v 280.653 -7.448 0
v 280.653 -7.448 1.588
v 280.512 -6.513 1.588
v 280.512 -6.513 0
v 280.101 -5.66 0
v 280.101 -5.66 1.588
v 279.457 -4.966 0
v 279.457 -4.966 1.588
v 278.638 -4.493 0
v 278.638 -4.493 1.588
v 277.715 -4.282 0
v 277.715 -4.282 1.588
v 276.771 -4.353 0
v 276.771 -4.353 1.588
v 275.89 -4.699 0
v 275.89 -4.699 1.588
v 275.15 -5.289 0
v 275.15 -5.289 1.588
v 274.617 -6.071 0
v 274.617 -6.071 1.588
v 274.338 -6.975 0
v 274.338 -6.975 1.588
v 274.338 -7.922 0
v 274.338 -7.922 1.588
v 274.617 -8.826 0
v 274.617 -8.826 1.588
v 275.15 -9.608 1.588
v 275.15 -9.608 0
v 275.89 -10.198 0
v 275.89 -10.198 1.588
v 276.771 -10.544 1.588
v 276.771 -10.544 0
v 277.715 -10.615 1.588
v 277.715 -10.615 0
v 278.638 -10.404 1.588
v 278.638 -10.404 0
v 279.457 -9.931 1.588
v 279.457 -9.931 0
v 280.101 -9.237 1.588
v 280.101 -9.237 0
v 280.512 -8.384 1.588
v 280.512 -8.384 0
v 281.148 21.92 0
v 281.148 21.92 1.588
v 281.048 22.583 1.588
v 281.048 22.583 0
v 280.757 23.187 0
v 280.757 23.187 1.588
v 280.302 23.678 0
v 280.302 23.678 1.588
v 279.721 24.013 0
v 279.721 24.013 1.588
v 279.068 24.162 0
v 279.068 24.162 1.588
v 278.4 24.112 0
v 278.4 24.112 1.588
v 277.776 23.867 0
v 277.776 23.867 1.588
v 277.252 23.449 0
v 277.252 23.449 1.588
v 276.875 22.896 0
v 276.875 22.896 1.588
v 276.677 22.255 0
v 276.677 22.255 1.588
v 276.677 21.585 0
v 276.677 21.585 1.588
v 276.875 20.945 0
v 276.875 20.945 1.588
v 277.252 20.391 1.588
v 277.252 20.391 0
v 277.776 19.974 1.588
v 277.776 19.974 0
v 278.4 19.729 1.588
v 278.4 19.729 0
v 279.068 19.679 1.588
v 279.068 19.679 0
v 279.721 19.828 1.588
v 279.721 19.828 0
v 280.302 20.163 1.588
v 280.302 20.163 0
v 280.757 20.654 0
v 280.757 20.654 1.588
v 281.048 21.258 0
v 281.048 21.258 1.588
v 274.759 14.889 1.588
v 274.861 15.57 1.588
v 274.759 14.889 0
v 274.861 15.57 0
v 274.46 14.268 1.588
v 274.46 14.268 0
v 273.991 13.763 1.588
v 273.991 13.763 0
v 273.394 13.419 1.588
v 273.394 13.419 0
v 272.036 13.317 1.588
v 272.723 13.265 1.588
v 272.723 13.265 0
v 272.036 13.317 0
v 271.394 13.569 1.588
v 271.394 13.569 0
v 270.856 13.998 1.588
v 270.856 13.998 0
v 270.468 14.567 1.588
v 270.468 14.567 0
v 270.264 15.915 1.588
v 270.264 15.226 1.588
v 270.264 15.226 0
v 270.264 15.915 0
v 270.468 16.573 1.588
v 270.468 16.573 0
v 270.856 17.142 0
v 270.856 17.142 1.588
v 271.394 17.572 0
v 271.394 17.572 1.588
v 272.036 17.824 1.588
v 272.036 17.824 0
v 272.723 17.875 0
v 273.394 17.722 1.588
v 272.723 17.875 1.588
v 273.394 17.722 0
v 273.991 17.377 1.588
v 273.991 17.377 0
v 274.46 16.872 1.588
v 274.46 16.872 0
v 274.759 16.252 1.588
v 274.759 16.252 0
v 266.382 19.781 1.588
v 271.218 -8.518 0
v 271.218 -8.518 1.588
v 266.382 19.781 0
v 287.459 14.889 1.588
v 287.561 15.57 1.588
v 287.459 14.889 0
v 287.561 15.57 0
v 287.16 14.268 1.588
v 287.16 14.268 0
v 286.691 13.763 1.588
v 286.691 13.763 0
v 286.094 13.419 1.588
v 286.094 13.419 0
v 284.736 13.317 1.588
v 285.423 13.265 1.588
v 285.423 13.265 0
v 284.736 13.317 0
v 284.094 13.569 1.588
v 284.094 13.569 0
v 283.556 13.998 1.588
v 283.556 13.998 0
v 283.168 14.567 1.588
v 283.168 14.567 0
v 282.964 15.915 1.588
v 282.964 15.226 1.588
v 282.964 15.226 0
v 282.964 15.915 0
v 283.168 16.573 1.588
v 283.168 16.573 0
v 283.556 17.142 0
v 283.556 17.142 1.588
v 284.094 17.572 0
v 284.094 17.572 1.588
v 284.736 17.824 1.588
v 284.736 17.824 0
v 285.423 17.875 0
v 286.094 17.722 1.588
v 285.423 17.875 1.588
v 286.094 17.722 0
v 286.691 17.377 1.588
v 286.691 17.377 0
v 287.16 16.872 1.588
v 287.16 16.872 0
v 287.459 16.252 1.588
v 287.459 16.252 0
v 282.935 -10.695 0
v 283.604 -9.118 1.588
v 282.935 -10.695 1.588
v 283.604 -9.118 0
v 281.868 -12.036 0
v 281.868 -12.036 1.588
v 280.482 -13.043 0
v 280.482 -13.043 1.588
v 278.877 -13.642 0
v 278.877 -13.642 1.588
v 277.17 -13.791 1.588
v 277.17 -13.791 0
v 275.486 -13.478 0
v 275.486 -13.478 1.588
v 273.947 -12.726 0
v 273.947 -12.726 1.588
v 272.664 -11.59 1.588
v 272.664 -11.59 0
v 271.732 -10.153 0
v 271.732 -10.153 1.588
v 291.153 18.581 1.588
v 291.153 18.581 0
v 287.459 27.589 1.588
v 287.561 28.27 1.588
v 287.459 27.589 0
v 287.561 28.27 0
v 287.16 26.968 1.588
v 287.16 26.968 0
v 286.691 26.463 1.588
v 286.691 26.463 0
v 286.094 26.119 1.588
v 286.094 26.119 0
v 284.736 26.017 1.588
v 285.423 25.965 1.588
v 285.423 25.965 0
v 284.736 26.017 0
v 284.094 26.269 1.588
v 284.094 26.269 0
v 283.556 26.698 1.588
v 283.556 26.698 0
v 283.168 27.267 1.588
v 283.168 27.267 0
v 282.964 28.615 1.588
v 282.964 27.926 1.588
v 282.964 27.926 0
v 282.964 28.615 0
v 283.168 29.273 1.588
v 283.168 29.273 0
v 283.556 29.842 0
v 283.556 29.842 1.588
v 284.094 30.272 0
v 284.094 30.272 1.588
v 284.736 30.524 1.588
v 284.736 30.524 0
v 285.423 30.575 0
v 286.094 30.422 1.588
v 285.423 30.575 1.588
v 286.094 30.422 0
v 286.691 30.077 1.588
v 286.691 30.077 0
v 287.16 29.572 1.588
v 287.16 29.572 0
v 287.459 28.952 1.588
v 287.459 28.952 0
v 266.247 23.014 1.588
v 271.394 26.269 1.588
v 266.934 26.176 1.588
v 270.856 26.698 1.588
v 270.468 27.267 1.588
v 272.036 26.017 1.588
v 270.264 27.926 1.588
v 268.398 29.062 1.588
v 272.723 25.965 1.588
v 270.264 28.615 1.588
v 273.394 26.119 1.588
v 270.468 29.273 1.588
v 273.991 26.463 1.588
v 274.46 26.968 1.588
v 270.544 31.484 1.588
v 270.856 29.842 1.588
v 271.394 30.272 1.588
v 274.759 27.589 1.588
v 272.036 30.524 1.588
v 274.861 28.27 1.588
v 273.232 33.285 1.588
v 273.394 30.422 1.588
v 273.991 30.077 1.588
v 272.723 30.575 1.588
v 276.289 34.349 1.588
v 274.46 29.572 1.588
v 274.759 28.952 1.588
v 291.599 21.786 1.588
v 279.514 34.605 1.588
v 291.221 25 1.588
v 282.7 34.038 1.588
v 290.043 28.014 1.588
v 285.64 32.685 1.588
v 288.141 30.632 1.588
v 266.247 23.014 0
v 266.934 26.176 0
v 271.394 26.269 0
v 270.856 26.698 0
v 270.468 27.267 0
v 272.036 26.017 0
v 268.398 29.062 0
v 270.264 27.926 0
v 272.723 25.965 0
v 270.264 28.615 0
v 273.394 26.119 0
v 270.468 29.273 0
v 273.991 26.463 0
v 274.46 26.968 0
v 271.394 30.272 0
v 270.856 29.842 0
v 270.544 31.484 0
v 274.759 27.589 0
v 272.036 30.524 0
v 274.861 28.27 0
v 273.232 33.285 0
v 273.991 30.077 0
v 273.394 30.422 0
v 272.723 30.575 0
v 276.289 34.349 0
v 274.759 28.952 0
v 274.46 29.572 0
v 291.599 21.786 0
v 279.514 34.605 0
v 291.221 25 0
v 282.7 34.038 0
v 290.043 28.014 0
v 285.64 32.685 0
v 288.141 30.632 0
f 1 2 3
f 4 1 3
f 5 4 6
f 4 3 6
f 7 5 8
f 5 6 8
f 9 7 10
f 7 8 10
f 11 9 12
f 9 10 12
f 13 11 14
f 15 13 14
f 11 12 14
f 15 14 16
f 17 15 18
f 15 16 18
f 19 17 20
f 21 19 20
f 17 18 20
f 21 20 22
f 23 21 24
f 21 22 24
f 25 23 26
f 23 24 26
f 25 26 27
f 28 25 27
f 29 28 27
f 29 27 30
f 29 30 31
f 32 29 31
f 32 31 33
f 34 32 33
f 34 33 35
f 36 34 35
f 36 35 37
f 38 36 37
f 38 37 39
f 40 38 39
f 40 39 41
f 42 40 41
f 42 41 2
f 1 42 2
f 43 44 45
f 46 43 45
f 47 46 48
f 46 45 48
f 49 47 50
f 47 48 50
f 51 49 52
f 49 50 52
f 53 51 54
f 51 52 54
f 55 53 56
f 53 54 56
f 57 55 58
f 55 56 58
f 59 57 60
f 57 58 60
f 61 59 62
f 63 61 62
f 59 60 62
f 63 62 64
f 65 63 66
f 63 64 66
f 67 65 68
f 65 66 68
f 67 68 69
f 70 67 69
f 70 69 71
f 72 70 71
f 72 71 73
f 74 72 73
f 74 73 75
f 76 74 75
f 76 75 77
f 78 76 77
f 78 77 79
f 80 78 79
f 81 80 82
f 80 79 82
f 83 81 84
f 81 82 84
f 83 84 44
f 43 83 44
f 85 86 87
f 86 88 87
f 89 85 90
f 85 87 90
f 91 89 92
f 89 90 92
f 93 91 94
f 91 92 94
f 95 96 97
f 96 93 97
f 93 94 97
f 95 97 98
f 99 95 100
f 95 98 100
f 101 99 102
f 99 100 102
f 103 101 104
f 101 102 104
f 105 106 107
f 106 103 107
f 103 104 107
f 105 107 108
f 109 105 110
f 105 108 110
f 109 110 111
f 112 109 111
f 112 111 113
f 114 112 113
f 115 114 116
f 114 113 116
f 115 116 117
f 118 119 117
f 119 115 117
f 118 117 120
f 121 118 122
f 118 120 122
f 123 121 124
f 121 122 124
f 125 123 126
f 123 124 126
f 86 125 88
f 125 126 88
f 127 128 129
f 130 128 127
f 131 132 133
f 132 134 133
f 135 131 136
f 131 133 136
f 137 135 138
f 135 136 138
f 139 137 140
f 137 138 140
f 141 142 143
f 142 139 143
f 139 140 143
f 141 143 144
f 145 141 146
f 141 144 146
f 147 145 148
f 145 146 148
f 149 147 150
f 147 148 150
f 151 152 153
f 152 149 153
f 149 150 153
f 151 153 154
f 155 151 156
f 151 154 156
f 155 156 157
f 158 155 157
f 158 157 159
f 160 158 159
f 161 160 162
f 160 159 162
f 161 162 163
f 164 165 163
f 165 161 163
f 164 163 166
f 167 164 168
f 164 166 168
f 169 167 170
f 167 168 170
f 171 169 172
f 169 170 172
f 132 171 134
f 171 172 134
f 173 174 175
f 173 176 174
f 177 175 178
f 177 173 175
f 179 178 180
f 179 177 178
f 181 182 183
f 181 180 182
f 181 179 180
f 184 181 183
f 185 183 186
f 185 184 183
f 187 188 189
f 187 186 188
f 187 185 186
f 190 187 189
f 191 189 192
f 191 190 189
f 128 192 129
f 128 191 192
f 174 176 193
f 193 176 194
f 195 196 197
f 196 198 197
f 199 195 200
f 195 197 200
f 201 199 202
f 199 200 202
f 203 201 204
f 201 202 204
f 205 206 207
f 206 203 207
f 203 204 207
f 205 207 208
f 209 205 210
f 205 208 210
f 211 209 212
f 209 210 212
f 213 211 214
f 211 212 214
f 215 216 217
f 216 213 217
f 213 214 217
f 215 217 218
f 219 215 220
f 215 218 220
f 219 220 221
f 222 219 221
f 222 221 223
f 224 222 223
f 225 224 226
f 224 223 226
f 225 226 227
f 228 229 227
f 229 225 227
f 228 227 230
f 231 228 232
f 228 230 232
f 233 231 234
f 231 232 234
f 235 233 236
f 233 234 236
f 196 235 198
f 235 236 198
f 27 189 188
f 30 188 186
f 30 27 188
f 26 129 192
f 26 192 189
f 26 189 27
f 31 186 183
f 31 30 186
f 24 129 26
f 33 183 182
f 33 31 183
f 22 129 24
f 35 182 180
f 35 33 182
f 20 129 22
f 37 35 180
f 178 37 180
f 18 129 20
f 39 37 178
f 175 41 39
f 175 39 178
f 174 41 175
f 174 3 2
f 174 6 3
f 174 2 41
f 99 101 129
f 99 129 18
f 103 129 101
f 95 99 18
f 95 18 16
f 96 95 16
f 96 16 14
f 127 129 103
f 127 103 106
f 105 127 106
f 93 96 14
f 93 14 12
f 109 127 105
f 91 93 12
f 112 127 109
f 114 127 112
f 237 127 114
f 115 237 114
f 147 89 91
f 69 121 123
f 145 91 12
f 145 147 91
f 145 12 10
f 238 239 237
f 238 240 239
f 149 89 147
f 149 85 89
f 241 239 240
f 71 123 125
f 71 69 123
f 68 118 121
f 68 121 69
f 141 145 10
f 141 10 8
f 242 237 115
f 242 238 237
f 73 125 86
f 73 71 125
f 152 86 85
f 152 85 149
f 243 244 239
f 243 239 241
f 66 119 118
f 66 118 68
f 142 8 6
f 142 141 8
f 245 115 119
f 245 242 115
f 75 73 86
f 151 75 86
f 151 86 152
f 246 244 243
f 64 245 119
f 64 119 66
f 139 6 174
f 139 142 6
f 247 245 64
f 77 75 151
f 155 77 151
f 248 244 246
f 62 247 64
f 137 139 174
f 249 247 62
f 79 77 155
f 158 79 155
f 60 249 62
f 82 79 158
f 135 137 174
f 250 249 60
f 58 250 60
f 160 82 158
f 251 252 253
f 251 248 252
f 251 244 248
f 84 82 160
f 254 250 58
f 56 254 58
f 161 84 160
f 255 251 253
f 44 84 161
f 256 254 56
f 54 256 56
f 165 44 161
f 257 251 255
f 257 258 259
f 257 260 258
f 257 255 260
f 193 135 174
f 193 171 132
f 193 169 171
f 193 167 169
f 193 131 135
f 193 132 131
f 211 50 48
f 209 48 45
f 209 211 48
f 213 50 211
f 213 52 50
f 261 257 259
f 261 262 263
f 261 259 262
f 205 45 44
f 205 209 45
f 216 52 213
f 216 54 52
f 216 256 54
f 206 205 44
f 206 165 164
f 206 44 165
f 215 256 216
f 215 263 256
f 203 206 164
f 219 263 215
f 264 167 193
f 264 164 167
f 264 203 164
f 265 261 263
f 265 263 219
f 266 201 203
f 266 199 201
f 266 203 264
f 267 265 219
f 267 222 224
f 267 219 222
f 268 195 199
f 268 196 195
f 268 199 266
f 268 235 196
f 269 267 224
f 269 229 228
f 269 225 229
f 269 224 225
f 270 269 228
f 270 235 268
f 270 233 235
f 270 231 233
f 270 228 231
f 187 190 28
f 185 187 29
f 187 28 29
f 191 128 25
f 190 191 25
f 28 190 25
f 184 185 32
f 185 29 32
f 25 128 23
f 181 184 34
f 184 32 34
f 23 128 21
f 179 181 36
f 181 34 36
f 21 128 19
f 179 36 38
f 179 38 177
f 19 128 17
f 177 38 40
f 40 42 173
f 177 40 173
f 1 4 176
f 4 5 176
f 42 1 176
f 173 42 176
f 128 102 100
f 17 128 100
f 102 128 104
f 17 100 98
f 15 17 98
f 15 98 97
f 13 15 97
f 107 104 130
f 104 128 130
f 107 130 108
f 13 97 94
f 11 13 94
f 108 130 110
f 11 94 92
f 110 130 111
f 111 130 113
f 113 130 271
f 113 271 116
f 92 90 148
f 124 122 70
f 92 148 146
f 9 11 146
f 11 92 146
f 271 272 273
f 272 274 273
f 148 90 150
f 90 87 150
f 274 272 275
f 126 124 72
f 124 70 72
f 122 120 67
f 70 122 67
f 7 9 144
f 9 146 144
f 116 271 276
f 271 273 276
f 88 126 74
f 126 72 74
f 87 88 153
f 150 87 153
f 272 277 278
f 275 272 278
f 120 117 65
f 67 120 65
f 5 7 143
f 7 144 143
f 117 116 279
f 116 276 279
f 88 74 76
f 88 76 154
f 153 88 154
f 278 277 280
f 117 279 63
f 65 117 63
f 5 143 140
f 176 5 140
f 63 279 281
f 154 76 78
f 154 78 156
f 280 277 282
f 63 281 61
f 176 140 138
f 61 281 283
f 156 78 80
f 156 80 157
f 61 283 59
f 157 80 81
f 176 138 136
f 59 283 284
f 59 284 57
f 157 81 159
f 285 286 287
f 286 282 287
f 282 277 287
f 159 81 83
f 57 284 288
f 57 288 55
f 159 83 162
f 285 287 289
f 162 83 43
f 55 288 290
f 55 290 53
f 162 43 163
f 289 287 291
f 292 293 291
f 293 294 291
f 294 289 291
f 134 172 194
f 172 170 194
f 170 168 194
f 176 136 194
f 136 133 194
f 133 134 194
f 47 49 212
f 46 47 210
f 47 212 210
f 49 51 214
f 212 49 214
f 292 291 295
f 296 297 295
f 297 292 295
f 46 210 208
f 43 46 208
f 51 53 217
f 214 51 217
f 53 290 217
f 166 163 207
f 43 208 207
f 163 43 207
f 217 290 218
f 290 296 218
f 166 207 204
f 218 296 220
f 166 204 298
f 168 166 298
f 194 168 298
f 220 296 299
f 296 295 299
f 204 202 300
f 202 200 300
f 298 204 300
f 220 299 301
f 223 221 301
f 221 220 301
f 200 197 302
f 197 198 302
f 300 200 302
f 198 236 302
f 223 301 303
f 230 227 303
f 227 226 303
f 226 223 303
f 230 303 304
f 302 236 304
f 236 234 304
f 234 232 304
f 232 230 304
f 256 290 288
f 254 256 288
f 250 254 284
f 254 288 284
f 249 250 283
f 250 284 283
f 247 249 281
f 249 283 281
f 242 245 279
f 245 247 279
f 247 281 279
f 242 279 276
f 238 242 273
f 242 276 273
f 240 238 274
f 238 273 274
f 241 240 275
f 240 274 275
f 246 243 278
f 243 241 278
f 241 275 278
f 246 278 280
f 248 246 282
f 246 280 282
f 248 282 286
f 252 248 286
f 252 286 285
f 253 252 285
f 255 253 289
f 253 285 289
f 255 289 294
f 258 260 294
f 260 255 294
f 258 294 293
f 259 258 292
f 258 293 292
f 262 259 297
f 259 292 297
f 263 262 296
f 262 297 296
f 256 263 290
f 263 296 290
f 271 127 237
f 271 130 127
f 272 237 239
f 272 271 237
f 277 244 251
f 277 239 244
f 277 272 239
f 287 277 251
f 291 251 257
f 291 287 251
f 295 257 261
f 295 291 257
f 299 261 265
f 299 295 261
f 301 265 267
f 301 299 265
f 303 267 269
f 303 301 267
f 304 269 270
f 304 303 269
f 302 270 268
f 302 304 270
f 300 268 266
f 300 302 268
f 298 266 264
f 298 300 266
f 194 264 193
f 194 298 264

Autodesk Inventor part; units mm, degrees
ref_plane "YZ Plane" through (0, 0, 0) normal (1, 0, 0) x (0, 1, 0)
ref_plane "XZ Plane" through (0, 0, 0) normal (0, 1, 0) x (-1, 0, 0)
ref_plane "XY Plane" through (0, 0, 0) normal (0, 0, 1) x (1, 0, 0)
ref_plane "Work Plane1" through (-1.4224, 0, 0) normal (0, 0, 1) x (1, 0, 0)
sketch "Sketch1" plane through (-1.4224, 0, 0) normal (0, 0, 1) x (1, 0, 0)
  circle A0 centre (280.3224, 21.9203) radius 2.3114 projected
  circle A1 centre (273.9724, 28.2703) radius 2.3114 projected
  circle A2 centre (286.6724, 28.2703) radius 2.3114 projected
  circle A3 centre (278.9, -7.4485) radius 2.3114 projected
  circle A4 centre (273.9724, 15.5703) radius 2.3114 projected
  circle A5 centre (286.6724, 15.5703) radius 2.3114 projected
  arc A6 (292.5755, 18.5809) -> (267.804, 19.7807) centre (280.3224, 21.9203) ccw
  arc A7 (272.6408, -8.5183) -> (285.0265, -9.1182) centre (278.9, -7.4485) ccw
  line L0 (285.0265, -9.1182) -> (292.5755, 18.5809)
  line L1 (272.6408, -8.5183) -> (267.804, 19.7807)
  circle A8 centre (280.3224, 21.9203) radius 2.3114
  circle A9 centre (273.9724, 15.5703) radius 2.3114
  circle A10 centre (286.6724, 15.5703) radius 2.3114
  point P0 (1.4224, 0)
  dimension "d0" = 25.4
  dimension "d1" = 12.7
extrude "Extrusion1" add sketch "Sketch1" along normal blind 1.5875 contours A0 | L0 A7 L1 A6
sketch "Sketch2" plane through (-1.4224, 0, 1.5875) normal (0, 0, 1) x (1, 0, 0)
  point P0 (1.4224, 0)
sketch "Sketch3" plane through (-1.4224, 0, 1.5875) normal (0, 0, 1) x (1, 0, 0)
  circle A0 centre (278.9, -7.4485) radius 2.3114 projected
  circle A1 centre (278.9, -7.4485) radius 3.175
  point P0 (1.4224, 0)
  dimension "d4" = 6.35
sketch "Sketch4" plane through (-1.4224, 0, 1.5875) normal (0, 0, 1) x (1, 0, 0)
  point P0 (1.4224, 0)
sketch "Sketch5" plane through (-1.4224, 0, 1.5875) normal (0, 0, 1) x (1, 0, 0)
  circle A0 centre (273.9724, 28.2703) radius 2.3114 projected
  circle A1 centre (273.9724, 28.2703) radius 2.3114
  circle A2 centre (286.6724, 28.2703) radius 2.3114 projected
  circle A3 centre (286.6724, 15.5703) radius 2.3114 projected
  circle A4 centre (273.9724, 15.5703) radius 2.3114 projected
  line L0 (273.9724, 28.2703) -> (286.6724, 15.5703)
  line L1 (286.6724, 15.5703) -> (286.6724, 28.2703)
  line L2 (286.6724, 28.2703) -> (273.9724, 15.5703)
  circle A5 centre (280.3224, 21.9203) radius 2.2479
  point P0 (1.4224, 0)
  dimension "d5" = 4.4958
extrude "Extrusion2" cut sketch "Sketch3" against normal blind 1.5875 contours A0 | A1
extrude "Extrusion3" cut sketch "Sketch5" against normal blind 1.5875 contours A5 L2 L0 | L0 L2 A5 | L2 A5 L0 | L0 A5 L2
properties part number "raised gear"
